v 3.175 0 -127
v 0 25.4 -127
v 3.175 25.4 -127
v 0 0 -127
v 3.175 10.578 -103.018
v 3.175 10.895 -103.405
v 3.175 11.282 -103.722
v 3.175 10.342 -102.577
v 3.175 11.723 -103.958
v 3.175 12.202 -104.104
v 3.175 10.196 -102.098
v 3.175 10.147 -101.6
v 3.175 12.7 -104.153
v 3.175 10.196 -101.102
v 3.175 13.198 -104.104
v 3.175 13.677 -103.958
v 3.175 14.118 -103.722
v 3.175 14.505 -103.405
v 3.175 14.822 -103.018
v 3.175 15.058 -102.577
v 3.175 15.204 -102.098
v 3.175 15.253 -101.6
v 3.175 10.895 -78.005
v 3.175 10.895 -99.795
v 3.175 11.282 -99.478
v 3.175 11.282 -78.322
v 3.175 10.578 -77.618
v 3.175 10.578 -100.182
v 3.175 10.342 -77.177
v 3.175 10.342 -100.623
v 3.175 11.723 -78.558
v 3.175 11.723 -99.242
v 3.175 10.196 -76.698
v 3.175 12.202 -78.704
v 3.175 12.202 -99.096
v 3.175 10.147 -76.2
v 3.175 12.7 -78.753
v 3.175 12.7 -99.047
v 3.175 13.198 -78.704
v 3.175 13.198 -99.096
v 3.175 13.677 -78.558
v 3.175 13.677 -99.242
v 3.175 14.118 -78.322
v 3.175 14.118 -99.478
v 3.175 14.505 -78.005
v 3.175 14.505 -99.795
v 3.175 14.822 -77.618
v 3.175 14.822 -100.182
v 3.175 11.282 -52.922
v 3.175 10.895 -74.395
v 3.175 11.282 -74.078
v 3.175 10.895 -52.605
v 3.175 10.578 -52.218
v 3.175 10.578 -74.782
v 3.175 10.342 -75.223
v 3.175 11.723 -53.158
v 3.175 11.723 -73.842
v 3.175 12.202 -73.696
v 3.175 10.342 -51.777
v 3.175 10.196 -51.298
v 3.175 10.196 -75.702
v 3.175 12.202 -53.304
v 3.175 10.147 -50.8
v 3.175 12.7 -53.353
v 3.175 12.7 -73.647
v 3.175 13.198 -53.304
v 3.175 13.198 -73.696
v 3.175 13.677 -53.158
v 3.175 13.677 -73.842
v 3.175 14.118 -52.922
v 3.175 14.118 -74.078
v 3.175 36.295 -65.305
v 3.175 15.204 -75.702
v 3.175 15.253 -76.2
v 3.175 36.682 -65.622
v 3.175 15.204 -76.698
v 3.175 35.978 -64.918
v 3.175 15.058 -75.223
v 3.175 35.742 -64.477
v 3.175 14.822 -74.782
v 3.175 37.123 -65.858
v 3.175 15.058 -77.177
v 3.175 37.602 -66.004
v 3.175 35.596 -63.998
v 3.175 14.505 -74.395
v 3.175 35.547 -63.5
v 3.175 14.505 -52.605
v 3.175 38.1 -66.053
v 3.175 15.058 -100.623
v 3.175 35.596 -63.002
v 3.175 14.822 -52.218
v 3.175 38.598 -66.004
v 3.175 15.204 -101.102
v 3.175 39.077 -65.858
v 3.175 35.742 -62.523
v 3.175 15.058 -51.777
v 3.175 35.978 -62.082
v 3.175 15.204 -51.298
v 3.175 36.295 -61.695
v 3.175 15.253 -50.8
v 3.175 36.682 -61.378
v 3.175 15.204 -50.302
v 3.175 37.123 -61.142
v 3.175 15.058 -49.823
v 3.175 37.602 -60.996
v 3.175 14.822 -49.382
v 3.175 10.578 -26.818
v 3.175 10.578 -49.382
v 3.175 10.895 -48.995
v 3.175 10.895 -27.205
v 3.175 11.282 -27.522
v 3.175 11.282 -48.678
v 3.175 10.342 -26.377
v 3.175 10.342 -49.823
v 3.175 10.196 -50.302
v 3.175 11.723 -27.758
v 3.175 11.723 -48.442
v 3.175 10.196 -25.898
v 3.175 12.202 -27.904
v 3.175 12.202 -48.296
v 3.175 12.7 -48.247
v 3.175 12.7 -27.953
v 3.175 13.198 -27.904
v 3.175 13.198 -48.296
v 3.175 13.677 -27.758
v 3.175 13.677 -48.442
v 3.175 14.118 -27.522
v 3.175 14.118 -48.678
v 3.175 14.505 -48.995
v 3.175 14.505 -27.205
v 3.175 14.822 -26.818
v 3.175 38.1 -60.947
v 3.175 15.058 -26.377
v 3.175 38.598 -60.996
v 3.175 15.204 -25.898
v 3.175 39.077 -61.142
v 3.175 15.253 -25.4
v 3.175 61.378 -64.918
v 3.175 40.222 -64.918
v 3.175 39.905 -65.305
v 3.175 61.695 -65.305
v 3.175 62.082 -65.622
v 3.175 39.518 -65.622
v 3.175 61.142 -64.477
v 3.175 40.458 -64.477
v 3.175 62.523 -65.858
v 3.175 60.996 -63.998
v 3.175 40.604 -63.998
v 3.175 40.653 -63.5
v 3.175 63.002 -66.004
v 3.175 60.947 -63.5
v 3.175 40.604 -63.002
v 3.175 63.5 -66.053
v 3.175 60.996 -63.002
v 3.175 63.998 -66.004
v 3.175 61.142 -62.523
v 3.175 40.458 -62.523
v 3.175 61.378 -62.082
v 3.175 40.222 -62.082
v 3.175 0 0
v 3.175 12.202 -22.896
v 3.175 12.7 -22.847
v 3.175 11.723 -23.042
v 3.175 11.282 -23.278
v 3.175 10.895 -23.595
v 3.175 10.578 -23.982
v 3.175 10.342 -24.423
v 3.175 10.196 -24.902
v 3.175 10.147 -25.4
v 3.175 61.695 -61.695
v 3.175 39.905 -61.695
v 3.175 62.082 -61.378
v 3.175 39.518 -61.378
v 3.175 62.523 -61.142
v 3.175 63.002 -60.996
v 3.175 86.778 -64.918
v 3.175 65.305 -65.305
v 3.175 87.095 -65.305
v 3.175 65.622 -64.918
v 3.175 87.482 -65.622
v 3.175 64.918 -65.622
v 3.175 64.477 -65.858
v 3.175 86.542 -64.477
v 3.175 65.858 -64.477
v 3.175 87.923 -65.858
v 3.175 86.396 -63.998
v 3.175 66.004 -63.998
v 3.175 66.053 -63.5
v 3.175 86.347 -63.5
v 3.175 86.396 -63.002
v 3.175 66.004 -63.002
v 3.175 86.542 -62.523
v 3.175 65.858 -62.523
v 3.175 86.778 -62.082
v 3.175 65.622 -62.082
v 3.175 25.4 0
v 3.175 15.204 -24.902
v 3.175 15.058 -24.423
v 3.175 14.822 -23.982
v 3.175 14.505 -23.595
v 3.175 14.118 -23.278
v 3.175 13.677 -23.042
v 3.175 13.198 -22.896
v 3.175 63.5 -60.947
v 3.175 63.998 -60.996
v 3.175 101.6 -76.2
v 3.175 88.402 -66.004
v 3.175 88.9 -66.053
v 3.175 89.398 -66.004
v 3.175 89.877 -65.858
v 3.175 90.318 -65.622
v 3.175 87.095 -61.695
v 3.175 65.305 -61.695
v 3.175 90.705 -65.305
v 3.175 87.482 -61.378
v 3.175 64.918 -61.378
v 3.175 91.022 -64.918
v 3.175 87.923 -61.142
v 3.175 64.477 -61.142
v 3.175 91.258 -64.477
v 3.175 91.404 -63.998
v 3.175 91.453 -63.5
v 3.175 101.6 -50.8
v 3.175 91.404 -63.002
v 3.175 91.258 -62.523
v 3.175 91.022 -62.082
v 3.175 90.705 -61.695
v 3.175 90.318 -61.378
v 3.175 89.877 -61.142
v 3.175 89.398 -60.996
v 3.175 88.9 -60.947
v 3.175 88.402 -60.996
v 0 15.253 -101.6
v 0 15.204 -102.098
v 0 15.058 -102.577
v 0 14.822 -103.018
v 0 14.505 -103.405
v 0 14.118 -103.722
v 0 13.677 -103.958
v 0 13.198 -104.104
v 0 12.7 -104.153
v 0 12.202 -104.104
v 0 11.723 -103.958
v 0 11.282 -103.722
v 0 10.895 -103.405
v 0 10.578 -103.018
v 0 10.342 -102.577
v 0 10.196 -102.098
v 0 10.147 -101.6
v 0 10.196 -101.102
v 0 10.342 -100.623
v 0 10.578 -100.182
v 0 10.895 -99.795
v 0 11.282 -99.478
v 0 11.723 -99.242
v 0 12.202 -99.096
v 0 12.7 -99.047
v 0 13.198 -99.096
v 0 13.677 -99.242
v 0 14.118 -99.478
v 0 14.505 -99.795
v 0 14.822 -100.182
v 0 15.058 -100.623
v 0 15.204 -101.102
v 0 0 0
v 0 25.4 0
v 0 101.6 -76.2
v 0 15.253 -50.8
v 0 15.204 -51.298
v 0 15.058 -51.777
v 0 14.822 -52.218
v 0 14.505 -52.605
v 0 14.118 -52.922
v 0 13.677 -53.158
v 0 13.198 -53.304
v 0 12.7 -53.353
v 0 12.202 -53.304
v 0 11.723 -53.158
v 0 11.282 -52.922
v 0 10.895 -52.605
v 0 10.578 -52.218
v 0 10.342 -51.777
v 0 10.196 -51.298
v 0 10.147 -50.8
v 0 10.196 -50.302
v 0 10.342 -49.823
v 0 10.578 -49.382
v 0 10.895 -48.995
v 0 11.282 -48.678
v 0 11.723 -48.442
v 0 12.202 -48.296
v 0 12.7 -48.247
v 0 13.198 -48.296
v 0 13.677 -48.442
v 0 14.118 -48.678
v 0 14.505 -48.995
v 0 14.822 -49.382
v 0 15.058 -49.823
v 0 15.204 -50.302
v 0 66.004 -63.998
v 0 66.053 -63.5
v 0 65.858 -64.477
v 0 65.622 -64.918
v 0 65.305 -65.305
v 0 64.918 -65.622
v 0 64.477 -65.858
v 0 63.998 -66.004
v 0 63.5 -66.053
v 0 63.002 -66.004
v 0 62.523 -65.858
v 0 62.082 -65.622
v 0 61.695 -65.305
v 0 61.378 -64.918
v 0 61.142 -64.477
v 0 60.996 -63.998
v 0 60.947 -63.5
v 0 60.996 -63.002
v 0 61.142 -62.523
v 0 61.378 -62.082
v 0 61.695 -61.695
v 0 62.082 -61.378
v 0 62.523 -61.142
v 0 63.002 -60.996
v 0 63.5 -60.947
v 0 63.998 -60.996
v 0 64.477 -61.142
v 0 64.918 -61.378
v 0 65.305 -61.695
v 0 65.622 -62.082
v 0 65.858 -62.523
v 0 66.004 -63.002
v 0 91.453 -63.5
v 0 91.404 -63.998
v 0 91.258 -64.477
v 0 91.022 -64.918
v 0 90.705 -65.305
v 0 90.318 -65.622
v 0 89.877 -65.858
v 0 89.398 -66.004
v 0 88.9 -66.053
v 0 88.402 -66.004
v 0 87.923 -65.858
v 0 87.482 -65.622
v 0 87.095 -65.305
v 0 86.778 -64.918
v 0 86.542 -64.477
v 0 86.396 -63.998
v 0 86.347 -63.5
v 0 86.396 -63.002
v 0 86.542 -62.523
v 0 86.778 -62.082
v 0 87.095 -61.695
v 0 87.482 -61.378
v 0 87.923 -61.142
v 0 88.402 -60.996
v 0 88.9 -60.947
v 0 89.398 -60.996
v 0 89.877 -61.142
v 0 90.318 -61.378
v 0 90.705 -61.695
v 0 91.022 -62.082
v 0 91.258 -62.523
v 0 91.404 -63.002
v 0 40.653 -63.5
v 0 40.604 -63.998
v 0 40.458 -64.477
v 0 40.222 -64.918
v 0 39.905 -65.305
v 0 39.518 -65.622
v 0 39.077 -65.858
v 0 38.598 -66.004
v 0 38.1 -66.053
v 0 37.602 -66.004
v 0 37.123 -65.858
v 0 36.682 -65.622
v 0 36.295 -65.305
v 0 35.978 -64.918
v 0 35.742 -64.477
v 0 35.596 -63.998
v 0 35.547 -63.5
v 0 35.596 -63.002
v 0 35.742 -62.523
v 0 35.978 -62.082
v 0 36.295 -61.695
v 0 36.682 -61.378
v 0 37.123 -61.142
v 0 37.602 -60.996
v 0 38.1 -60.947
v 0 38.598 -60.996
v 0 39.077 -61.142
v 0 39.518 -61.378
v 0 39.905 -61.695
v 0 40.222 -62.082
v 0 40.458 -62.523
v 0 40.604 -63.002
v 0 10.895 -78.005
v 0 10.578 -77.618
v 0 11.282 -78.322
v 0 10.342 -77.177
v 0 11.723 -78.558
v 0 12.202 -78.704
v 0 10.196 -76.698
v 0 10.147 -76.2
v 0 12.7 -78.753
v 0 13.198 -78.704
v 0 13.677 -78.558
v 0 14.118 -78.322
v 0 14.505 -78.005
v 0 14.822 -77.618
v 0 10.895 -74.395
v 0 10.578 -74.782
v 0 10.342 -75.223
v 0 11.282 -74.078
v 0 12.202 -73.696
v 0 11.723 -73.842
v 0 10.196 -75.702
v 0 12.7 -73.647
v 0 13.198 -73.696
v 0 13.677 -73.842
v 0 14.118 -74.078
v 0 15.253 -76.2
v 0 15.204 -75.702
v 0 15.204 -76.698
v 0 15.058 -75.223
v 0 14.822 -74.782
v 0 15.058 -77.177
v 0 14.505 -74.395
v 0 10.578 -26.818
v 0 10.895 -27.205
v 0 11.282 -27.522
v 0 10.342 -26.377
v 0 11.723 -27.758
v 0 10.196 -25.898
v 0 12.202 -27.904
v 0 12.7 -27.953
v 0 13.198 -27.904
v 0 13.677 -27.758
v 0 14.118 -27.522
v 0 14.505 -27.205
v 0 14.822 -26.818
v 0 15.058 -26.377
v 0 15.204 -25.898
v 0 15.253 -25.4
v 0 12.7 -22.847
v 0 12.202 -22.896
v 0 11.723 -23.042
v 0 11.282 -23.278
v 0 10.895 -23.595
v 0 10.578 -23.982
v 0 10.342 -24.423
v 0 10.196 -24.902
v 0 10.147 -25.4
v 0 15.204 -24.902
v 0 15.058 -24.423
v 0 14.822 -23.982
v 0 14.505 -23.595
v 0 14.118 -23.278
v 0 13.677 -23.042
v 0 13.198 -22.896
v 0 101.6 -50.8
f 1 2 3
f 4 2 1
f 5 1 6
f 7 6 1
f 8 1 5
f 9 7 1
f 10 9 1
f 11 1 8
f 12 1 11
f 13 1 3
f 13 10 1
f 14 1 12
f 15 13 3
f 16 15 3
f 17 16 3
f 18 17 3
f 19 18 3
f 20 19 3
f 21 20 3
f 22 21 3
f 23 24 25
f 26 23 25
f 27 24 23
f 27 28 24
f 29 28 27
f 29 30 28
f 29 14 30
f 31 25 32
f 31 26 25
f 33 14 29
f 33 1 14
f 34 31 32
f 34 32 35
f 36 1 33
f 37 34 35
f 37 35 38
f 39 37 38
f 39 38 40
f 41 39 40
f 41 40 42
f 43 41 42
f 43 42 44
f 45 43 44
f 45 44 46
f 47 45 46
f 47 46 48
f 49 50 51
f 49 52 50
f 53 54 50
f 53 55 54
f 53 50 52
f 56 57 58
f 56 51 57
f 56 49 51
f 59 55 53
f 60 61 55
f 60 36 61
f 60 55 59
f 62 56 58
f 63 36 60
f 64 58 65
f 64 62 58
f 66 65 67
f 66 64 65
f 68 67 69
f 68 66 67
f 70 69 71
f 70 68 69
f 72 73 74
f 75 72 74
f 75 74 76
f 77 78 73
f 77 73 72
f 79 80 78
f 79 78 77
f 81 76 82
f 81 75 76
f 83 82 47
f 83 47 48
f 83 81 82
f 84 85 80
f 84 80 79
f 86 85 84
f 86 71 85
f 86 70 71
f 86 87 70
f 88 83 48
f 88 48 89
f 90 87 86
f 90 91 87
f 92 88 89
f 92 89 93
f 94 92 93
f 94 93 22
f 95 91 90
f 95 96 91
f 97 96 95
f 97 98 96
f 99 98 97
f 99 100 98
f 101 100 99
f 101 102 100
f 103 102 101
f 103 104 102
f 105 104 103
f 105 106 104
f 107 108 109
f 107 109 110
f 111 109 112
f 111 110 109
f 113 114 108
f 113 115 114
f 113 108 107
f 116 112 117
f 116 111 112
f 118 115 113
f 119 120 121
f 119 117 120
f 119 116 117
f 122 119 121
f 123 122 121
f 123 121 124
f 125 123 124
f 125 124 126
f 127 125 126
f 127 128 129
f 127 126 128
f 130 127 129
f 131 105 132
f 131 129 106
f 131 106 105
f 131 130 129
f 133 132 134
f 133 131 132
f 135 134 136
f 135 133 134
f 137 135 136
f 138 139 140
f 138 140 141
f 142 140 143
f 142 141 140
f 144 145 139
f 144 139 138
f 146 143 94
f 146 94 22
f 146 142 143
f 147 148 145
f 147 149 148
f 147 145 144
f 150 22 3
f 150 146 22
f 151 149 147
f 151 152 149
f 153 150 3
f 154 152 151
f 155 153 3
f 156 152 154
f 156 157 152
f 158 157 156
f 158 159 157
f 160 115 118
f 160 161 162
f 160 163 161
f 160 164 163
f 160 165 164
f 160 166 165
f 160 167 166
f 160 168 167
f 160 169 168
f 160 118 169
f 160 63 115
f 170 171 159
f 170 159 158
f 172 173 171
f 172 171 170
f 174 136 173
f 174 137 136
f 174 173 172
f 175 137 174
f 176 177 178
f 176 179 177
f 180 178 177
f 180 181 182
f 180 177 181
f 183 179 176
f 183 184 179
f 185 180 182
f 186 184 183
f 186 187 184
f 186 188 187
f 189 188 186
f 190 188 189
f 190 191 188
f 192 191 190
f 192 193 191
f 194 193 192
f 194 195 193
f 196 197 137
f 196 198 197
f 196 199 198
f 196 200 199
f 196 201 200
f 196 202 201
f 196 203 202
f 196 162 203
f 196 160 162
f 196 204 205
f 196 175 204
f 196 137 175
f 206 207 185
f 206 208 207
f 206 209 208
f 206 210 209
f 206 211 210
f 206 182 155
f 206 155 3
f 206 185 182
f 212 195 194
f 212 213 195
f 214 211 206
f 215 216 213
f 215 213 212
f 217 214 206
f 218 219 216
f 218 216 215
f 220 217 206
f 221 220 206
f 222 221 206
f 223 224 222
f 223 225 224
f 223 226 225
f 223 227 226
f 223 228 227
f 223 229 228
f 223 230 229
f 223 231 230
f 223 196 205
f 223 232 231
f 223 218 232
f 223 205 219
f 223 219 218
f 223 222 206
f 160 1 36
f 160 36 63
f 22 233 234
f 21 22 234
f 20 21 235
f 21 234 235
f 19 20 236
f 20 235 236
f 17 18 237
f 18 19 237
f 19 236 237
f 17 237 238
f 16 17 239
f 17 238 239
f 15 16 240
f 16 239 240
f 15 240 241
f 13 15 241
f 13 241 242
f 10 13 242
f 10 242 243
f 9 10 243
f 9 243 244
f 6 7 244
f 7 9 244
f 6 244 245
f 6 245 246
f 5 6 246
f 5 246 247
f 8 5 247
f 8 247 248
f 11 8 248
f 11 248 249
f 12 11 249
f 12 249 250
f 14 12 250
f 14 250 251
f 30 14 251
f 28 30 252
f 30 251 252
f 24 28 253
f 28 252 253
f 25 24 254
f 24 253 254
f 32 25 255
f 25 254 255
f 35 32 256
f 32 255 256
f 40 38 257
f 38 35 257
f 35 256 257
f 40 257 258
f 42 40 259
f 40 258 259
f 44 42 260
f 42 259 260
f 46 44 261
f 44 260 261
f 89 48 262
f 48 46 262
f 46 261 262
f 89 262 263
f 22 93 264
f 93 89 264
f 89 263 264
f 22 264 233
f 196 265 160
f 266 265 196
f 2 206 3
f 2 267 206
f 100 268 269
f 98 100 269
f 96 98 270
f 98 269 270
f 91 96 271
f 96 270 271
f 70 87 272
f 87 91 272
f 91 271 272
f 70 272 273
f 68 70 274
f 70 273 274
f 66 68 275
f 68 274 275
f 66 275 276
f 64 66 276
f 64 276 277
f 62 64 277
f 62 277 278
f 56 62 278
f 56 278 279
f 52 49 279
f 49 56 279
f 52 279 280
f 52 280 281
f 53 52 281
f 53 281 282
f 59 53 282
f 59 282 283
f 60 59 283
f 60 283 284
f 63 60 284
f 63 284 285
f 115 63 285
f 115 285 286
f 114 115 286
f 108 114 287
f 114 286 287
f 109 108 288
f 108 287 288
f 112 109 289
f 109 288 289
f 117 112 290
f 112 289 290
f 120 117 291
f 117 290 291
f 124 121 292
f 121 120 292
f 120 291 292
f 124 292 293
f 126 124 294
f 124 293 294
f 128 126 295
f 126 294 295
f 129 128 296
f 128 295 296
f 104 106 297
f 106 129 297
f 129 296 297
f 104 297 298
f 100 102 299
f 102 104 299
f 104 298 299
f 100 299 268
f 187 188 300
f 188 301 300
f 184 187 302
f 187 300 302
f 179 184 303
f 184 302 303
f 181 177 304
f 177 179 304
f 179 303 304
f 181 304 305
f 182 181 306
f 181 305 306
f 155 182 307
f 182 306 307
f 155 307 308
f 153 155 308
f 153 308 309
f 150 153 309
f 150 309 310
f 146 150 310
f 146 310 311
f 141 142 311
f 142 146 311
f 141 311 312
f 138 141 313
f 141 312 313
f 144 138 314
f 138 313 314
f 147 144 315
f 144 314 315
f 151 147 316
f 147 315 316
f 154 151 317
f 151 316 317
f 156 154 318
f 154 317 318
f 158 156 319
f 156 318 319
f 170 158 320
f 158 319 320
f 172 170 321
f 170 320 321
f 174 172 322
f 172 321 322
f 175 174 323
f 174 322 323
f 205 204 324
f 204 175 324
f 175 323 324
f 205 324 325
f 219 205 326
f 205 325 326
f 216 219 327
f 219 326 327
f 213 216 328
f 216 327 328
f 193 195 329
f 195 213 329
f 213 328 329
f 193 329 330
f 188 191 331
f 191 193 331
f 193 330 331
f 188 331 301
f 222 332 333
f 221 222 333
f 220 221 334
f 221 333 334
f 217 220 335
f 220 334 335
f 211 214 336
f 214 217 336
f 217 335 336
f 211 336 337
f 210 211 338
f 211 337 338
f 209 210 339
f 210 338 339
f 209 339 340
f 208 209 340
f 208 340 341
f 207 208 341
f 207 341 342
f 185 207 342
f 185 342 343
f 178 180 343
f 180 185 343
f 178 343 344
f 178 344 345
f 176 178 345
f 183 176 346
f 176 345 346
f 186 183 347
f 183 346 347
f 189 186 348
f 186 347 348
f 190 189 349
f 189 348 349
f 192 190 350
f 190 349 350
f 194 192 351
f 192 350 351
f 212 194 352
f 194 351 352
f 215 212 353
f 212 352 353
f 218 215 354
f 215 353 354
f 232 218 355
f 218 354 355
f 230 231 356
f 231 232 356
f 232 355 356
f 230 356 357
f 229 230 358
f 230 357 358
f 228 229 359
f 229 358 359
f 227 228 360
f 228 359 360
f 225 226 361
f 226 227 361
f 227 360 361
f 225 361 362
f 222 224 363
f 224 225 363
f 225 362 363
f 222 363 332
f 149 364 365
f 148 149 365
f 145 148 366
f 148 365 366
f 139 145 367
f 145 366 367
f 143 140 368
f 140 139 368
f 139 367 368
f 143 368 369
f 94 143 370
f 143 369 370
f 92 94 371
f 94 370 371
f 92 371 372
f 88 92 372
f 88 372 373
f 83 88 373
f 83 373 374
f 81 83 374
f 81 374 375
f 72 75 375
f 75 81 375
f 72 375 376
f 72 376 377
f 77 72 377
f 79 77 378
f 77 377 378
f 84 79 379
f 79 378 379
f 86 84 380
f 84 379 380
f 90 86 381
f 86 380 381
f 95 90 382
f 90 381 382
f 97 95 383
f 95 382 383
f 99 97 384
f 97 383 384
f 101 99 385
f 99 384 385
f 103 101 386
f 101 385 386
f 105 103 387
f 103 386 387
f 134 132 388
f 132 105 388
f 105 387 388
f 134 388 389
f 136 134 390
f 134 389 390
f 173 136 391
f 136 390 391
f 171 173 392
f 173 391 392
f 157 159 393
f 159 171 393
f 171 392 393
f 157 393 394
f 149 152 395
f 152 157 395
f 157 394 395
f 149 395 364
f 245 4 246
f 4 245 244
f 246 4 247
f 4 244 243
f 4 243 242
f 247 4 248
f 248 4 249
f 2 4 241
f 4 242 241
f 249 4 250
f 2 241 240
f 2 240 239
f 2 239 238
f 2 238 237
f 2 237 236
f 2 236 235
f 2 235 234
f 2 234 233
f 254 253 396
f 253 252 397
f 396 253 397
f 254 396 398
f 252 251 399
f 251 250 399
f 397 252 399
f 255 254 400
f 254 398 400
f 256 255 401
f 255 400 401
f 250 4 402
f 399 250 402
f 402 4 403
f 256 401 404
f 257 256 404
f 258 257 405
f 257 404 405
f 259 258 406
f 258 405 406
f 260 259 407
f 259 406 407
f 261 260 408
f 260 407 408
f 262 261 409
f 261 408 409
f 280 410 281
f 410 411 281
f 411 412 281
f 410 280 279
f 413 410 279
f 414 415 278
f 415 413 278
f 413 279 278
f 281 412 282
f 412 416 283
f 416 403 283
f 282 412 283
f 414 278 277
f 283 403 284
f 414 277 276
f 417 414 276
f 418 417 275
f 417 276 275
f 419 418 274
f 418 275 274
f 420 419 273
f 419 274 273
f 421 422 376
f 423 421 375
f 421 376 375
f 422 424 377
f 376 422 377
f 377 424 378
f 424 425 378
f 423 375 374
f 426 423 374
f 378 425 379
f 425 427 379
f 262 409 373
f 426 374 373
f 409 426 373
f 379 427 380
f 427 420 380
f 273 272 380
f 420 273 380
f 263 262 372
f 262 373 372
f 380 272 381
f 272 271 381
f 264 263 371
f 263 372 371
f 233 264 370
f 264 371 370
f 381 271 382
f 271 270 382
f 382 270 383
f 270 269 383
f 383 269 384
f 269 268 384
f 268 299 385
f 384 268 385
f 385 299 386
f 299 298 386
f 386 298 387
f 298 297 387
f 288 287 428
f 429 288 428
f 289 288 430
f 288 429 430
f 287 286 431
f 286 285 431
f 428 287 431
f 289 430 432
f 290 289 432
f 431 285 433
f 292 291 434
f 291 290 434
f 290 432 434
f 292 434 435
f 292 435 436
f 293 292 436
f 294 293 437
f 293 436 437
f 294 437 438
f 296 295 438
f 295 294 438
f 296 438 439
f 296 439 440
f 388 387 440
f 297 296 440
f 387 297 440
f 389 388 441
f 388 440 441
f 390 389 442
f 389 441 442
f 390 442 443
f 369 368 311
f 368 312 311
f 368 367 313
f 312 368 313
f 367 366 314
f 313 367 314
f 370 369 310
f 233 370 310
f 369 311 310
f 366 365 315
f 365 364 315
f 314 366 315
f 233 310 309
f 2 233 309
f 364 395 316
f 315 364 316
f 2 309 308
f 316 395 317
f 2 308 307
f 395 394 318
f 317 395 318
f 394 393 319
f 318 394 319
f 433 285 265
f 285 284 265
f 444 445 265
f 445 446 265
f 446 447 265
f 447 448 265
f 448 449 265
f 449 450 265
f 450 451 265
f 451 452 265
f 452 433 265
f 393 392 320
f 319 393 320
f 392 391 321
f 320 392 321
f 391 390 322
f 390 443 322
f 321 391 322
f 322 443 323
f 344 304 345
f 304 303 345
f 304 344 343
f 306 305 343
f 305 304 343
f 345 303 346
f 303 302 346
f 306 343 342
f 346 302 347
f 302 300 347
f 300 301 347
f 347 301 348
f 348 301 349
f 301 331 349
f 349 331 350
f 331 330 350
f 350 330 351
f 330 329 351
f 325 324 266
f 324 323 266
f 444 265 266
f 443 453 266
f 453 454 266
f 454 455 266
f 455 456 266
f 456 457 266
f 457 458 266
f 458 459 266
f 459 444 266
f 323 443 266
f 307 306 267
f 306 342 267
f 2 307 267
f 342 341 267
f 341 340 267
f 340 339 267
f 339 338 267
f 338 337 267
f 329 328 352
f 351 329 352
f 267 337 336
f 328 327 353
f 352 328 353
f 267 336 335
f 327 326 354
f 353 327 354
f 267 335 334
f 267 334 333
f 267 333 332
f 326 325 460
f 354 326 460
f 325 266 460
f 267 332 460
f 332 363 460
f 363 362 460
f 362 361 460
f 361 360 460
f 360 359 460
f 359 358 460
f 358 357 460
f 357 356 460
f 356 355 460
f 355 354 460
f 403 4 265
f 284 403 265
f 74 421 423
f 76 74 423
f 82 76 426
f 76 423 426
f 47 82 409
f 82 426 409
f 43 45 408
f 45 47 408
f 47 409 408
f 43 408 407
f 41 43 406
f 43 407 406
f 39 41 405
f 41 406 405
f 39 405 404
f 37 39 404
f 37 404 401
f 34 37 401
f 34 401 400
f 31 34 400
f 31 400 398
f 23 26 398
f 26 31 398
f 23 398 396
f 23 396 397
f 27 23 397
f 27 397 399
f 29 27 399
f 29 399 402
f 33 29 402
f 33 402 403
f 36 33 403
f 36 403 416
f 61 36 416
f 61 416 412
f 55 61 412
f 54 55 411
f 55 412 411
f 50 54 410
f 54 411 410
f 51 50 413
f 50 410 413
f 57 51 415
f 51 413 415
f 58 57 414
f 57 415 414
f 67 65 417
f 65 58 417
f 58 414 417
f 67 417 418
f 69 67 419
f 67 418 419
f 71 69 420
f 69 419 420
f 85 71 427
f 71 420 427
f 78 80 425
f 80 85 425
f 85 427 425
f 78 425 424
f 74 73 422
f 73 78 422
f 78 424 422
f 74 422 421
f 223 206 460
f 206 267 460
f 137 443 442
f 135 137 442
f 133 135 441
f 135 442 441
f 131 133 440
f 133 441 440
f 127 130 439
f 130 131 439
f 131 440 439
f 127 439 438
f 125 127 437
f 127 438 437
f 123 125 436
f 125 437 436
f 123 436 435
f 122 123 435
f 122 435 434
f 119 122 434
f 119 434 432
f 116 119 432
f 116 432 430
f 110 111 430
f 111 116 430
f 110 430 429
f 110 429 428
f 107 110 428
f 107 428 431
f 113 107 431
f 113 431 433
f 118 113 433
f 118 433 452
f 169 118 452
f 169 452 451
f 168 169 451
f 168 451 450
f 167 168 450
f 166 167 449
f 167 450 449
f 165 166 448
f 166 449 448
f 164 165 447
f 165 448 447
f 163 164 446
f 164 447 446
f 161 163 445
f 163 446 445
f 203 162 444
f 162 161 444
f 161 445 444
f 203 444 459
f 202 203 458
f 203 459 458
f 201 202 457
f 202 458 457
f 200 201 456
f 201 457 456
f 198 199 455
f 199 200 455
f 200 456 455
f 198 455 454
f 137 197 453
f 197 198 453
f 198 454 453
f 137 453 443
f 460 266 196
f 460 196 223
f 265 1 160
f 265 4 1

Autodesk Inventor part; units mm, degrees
ref_plane "YZ Plane" through (0, 0, 0) normal (1, 0, 0) x (0, 1, 0)
ref_plane "XZ Plane" through (0, 0, 0) normal (0, 1, 0) x (-1, 0, 0)
ref_plane "XY Plane" through (0, 0, 0) normal (0, 0, 1) x (1, 0, 0)
sketch "Sketch1" plane through (0, 0, 0) normal (1, 0, 0) x (0, 1, 0)
  line L0 (0, 0) -> (25.4, 0)
  line L1 (25.4, 0) -> (25.4, -127)
  line L2 (25.4, -127) -> (0, -127)
  line L3 (0, -127) -> (0, 0)
  line L4 (101.6, -50.8) -> (25.4, -50.8)
  line L5 (25.4, -50.8) -> (25.4, -76.2)
  line L6 (25.4, -76.2) -> (101.6, -76.2)
  line L7 (101.6, -76.2) -> (101.6, -50.8)
  circle A0 centre (12.7, -25.4) radius 2.5527
  circle A1 centre (12.7, -50.8) radius 2.5527
  circle A2 centre (12.7, -76.2) radius 2.5527
  circle A3 centre (12.7, -101.6) radius 2.5527
  circle A4 centre (88.9, -63.5) radius 2.5527
  circle A5 centre (63.5, -63.5) radius 2.5527
  circle A6 centre (38.1, -63.5) radius 2.5527
  line L8 (25.4, 0) -> (101.6, -50.8)
  line L9 (101.6, -76.2) -> (25.4, -127)
  point P0 (25.4, -63.5)
  dimension "d0" = 25.4
  dimension "d1" = 127
  dimension "d2" = 76.2
  dimension "d3" = 25.4
  dimension "d4" = 5.1054
  dimension "d5" = 25.4
  dimension "d6" = 12.7
  dimension "d9" = 25.4
  dimension "d14" = 5.1054
  dimension "d15" = 12.7
  dimension "d16" = 12.7
  dimension "d19" = 25.4
extrude "Extrusion1" add sketch "Sketch1" along normal blind 3.175
properties part number "T-Gusset" material "Aluminum 6061"
